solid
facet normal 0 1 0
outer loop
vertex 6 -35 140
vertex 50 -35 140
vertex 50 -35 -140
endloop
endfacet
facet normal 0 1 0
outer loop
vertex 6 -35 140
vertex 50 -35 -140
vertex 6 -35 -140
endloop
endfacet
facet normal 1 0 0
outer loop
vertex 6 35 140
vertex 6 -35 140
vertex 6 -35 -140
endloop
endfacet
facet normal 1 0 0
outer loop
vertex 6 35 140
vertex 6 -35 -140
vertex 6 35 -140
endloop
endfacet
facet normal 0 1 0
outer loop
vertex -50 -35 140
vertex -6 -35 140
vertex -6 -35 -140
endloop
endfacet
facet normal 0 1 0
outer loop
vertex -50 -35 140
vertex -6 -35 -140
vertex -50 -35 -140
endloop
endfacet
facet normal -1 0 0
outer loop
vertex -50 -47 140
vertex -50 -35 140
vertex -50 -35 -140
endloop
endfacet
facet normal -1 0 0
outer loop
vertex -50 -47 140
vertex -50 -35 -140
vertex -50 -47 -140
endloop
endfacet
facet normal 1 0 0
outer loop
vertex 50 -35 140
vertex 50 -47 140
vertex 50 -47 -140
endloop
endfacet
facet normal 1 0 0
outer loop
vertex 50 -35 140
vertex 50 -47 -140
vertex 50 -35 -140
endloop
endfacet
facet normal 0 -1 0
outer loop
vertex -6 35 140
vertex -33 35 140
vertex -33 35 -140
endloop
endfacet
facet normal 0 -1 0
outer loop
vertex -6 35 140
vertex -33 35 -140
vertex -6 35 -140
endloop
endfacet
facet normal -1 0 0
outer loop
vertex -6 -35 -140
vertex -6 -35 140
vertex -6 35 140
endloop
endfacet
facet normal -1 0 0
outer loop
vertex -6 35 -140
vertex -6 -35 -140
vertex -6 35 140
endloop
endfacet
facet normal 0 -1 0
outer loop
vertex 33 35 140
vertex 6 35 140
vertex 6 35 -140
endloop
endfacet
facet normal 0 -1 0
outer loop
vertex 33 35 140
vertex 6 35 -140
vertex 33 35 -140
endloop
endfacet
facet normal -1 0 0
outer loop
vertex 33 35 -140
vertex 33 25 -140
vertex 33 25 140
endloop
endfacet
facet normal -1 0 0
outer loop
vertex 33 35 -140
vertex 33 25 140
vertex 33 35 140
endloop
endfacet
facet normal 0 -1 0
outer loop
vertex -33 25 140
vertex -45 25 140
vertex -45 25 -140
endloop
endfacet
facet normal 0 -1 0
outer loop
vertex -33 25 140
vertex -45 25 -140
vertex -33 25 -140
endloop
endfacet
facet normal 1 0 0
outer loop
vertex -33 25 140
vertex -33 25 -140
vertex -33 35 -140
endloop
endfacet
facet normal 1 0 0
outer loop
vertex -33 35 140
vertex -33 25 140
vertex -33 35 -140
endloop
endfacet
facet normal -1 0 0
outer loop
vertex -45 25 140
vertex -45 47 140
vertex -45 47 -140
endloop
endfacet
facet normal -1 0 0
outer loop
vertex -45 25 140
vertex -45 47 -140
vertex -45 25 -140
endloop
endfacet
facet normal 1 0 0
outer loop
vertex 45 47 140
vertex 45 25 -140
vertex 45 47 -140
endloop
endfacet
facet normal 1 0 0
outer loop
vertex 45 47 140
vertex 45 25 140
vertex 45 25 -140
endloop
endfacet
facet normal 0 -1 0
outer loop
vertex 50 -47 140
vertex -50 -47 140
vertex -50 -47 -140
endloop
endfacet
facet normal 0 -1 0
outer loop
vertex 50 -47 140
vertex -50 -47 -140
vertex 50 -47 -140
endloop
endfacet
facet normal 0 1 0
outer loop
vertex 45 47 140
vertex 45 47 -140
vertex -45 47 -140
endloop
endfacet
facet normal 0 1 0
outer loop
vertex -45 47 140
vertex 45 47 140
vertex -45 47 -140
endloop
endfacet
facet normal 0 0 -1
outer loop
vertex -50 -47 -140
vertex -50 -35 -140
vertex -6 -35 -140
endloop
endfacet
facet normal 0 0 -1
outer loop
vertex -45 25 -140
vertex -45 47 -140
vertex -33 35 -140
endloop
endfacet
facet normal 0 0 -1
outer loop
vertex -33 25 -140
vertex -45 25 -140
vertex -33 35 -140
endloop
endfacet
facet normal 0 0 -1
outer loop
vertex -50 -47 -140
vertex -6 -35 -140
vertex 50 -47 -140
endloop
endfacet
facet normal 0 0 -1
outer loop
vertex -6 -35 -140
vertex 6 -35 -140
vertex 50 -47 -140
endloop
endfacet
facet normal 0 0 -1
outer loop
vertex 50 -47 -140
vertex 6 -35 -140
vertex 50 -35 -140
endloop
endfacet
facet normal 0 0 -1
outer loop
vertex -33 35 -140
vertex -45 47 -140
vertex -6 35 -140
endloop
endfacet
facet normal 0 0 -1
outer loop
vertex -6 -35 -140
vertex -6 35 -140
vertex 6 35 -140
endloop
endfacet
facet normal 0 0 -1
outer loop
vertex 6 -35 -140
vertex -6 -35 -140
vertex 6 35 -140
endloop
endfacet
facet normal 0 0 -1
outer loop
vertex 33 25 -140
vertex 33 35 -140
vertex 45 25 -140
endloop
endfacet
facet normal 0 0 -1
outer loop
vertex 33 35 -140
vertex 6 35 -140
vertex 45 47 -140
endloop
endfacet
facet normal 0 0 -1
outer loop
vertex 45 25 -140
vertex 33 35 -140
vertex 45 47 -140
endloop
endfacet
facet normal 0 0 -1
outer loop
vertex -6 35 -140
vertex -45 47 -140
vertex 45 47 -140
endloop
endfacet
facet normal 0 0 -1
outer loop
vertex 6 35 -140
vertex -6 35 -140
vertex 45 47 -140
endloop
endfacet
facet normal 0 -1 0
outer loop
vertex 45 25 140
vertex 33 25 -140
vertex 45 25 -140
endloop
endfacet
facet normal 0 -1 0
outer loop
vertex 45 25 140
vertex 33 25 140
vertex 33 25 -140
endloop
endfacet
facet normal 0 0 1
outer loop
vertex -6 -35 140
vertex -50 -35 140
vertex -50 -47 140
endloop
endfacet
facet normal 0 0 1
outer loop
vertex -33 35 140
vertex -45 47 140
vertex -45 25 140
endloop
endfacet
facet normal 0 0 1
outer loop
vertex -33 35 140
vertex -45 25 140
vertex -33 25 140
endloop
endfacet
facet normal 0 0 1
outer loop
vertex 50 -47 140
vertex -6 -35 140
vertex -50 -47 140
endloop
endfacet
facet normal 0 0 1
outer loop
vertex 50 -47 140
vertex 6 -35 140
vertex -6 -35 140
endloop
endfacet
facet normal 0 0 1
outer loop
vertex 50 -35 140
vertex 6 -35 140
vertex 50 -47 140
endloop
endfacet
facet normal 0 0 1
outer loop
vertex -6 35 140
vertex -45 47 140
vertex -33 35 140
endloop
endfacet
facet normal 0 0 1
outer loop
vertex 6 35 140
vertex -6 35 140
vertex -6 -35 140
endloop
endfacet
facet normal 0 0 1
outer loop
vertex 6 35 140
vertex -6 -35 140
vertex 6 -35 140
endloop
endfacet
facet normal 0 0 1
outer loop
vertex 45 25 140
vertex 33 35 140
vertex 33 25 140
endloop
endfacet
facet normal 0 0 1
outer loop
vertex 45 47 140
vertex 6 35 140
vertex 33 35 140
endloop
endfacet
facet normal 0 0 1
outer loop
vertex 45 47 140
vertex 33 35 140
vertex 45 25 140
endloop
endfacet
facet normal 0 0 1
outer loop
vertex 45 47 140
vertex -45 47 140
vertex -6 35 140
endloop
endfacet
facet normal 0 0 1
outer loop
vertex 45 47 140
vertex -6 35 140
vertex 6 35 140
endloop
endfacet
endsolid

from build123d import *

# Parameters (mm, degrees)
SKETCH_1_W      = 12
SKETCH_1_H      = 70
SKETCH_1_H_2    = 10
EXTRUDE_1_DEPTH = 140


with BuildPart() as part:
    # Эскиз1 → Бобышка-Вытянуть1 (new, symmetric)
    with BuildSketch(Plane.XY):
        Polygon((-33, 35), (-6, 35), (6, 35), (33, 35), (45, 35), (45, 47), (-45, 47), (-45, 35), align=None)
        Rectangle(SKETCH_1_W, SKETCH_1_H)
        Polygon((6, -35), (-6, -35), (-50, -35), (-50, -47), (50, -47), (50, -35), align=None)
        with Locations((39, 30)):
            Rectangle(SKETCH_1_W, SKETCH_1_H_2)
        with Locations((-39, 30)):
            Rectangle(SKETCH_1_W, SKETCH_1_H_2)
    extrude(amount=EXTRUDE_1_DEPTH, both=True)


solid = part.part
